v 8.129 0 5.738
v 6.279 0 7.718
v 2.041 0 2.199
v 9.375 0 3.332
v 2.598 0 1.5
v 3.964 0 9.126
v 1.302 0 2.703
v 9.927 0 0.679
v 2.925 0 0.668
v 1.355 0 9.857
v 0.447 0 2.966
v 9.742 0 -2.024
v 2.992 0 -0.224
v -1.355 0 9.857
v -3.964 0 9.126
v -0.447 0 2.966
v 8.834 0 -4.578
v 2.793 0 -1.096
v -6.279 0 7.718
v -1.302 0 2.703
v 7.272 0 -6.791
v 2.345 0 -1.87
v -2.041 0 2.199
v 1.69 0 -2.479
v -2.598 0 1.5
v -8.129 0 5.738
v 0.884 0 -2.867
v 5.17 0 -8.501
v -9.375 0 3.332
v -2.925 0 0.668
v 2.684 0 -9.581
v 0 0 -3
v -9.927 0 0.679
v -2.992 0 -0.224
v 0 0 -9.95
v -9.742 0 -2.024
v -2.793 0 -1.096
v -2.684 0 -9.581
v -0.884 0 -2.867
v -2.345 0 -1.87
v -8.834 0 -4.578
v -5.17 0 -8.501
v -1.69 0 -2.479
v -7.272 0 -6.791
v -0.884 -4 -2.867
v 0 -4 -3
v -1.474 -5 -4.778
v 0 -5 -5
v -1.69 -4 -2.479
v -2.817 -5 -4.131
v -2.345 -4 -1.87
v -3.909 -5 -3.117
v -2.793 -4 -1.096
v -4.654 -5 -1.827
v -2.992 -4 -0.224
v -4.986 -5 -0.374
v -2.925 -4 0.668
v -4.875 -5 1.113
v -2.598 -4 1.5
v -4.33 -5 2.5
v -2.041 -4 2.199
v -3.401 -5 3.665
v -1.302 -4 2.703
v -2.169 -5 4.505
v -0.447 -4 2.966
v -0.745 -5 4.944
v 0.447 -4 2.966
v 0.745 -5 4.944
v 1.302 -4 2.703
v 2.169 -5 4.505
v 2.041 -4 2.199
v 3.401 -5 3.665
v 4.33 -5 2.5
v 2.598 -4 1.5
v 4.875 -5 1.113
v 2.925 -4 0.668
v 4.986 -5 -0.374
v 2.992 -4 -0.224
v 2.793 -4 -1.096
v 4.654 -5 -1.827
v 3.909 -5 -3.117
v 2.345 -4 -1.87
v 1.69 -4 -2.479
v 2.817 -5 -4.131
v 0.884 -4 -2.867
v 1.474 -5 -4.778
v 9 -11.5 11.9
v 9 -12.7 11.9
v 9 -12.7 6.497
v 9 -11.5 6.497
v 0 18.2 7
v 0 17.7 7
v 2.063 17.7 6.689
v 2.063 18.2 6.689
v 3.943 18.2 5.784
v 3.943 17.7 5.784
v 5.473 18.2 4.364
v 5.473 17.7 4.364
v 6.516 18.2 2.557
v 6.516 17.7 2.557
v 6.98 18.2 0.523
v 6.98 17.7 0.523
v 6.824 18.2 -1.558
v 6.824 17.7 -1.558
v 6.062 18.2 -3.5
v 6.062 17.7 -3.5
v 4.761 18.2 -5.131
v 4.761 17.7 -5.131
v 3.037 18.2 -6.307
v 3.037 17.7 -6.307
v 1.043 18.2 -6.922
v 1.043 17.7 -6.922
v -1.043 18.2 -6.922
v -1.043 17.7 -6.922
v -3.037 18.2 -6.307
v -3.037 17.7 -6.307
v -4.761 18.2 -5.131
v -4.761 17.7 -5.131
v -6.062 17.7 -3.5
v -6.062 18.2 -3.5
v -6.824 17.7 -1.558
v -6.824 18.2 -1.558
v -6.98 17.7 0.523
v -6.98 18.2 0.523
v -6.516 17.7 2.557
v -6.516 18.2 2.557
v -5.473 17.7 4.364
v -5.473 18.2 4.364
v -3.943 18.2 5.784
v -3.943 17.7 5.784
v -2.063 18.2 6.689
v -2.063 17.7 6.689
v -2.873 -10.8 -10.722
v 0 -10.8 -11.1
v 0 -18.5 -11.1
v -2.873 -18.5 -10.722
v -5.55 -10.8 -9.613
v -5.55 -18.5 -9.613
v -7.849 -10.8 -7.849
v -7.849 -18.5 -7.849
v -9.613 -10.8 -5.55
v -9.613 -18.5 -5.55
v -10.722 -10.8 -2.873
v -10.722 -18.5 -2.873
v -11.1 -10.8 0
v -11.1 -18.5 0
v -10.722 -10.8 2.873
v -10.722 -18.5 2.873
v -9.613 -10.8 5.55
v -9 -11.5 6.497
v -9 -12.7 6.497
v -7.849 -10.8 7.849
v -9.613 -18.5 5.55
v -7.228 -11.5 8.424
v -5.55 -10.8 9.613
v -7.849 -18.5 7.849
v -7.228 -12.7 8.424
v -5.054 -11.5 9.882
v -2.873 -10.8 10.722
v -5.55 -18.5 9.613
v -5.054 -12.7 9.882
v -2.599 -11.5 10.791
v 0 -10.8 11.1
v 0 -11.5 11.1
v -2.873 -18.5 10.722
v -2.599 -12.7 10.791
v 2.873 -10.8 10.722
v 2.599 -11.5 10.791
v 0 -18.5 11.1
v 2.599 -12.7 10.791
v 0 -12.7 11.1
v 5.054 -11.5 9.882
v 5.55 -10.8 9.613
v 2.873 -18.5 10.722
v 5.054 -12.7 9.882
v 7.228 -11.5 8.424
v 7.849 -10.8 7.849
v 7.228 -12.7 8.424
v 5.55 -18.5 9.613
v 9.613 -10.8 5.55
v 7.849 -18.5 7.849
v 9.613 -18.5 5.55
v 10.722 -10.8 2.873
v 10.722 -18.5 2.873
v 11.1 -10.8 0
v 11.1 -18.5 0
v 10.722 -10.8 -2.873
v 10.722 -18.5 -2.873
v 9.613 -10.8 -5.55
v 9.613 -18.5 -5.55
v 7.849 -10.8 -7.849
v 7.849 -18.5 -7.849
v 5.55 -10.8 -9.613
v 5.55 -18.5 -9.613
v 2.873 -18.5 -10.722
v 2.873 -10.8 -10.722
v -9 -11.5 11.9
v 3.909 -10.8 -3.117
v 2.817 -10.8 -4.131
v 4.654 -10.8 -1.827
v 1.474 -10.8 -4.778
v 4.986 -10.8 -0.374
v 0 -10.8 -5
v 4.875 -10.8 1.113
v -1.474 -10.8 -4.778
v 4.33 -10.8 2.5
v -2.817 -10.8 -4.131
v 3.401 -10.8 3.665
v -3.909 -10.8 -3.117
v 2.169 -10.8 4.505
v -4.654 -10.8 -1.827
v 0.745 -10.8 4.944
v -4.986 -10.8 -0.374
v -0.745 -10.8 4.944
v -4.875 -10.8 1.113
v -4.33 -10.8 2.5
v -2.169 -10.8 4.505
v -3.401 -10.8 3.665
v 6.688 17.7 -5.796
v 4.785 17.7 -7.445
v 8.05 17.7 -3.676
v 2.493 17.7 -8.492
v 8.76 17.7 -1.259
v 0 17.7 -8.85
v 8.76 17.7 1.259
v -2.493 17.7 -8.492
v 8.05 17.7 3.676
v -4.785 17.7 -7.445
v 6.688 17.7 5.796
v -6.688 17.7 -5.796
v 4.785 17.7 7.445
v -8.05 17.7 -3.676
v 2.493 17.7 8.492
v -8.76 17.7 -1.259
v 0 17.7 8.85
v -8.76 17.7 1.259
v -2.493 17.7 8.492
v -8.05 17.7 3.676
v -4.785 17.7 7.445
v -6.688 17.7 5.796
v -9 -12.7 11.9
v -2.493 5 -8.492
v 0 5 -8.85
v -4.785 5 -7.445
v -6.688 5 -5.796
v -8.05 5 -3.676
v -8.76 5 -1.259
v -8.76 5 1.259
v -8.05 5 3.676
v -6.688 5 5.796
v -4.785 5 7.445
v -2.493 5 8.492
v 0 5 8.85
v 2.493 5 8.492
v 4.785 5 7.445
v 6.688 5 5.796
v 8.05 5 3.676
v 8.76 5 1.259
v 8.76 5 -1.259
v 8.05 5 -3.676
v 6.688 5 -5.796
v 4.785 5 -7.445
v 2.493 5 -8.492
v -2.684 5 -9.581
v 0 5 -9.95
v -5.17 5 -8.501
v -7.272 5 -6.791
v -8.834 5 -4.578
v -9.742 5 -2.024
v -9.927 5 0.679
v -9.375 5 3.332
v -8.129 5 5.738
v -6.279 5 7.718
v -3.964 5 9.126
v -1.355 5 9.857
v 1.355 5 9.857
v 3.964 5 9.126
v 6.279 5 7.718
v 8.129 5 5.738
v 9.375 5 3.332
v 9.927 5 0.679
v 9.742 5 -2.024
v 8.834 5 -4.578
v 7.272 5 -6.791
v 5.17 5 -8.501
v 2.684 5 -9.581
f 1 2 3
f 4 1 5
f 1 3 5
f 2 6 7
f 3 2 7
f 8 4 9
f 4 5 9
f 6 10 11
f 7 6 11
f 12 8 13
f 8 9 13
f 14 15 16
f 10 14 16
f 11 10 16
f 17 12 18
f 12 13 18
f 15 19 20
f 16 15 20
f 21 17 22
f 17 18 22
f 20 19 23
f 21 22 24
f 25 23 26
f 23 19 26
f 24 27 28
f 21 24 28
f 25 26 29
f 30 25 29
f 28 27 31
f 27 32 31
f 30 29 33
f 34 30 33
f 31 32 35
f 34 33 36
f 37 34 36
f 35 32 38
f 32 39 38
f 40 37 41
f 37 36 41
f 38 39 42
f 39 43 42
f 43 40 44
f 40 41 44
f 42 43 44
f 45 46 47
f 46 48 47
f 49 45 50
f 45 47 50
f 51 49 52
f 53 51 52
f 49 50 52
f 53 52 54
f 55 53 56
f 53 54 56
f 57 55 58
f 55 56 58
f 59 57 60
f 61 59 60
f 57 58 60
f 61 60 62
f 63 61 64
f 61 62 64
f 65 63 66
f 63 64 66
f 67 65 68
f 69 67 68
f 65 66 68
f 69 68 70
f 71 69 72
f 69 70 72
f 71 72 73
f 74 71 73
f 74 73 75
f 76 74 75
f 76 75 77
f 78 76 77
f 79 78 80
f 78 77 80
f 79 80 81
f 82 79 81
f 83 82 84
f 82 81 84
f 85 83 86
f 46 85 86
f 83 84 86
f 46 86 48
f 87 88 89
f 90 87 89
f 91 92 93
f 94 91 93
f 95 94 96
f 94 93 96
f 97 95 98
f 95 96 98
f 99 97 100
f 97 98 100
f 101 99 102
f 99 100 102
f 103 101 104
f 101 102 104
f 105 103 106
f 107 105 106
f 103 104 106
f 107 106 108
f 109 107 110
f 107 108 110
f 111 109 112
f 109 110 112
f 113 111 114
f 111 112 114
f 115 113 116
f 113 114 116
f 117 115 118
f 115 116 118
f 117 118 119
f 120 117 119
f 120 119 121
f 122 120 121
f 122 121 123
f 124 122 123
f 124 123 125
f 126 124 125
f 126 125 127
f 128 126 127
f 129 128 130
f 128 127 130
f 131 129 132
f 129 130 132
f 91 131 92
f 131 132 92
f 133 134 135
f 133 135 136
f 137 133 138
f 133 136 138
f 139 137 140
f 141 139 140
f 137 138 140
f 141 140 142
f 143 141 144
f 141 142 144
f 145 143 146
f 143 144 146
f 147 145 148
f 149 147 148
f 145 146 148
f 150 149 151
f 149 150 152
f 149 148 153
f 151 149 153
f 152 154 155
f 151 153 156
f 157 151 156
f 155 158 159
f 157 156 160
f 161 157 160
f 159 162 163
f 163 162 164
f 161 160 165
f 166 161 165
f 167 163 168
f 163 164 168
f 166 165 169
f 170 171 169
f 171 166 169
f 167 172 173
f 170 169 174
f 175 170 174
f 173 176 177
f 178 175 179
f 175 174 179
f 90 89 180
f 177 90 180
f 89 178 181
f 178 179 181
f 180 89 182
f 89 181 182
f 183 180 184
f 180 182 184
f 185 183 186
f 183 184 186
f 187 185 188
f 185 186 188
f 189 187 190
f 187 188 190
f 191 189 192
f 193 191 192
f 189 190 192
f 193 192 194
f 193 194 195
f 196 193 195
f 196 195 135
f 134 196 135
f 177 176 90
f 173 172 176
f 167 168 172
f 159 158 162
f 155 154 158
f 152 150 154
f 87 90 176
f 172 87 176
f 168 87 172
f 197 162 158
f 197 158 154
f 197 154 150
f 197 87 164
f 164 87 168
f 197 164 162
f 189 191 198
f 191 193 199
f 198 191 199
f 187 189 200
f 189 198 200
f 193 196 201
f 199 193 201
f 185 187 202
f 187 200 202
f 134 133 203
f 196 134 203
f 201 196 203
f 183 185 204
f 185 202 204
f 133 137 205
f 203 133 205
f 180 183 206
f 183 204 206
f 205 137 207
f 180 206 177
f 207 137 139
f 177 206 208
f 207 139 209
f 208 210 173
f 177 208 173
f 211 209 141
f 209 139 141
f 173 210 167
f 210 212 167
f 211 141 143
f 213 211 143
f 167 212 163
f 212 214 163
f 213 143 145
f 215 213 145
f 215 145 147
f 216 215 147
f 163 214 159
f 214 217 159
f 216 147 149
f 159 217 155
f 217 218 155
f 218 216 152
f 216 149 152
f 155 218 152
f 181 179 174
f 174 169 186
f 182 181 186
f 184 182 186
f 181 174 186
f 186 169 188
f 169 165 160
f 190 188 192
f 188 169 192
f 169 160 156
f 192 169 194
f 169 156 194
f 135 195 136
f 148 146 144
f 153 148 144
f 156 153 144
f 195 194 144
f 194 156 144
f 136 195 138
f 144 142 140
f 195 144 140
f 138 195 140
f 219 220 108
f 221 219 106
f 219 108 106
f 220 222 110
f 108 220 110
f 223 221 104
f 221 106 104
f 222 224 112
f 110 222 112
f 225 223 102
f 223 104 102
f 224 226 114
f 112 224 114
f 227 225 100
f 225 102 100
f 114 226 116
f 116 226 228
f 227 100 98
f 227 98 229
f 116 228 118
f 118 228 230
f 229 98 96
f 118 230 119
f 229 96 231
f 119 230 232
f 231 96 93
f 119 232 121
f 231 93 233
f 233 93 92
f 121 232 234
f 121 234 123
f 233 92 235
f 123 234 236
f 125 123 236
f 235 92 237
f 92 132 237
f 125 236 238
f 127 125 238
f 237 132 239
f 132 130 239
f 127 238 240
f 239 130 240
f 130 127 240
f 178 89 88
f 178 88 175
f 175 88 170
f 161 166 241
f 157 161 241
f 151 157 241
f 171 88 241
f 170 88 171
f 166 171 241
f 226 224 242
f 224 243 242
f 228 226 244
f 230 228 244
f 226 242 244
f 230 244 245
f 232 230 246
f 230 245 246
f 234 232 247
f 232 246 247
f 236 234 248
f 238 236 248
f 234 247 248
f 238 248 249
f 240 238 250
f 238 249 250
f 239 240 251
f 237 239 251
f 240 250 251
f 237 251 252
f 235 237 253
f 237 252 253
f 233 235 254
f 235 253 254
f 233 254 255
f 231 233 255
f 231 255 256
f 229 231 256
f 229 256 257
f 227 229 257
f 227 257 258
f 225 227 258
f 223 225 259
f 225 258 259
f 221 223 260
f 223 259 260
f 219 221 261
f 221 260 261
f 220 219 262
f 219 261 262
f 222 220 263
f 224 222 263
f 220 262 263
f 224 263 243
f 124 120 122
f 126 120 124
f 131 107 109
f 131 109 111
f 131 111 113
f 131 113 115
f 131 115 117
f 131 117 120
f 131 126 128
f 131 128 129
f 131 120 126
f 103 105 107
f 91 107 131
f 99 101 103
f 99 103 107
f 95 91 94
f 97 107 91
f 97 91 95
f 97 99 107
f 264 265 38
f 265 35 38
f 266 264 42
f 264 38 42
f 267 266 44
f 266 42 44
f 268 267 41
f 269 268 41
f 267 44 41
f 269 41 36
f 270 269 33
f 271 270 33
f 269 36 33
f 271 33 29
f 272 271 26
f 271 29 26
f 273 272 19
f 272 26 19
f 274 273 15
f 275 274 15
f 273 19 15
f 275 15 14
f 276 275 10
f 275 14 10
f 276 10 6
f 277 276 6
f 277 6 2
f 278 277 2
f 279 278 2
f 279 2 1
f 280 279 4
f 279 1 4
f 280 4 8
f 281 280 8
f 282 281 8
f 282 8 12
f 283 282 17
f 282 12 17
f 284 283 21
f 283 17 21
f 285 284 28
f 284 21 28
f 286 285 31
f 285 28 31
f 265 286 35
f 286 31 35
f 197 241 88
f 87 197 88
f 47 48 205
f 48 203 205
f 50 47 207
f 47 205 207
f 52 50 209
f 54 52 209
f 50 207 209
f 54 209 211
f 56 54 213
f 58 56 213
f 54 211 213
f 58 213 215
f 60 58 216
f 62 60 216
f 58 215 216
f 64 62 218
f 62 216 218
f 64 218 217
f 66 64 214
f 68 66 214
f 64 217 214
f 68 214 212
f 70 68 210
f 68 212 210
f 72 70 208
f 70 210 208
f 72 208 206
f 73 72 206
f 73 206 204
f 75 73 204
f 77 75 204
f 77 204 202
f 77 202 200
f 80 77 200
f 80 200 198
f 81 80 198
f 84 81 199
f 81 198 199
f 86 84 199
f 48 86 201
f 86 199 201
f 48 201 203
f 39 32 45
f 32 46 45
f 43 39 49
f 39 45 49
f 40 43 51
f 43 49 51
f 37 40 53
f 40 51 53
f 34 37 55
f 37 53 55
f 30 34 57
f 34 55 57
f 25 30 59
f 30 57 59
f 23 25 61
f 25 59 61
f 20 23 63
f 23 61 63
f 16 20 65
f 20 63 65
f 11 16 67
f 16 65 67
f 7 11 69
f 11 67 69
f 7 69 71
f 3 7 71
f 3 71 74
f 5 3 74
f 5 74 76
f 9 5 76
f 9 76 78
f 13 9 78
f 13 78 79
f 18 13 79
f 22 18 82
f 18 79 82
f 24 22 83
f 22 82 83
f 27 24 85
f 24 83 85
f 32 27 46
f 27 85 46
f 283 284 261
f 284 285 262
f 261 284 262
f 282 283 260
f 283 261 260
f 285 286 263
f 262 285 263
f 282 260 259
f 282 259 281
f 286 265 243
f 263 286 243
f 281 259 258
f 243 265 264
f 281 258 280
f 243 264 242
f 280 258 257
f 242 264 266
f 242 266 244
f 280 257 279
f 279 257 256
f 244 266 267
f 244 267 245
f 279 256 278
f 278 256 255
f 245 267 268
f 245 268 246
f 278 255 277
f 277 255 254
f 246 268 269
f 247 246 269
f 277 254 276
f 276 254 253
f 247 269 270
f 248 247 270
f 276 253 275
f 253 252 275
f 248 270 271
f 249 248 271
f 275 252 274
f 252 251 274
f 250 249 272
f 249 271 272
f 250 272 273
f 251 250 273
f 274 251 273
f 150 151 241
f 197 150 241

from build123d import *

# Parameters (mm, degrees)
BOSS_EXTRU_1_START = -5.8
BOSS_EXTRU_1_DEPTH = 1.2
ESQUISSE4_R        = 7
BOSS_EXTRU_2_DEPTH = 0.5


with BuildPart() as part:
    # Esquisse2 → Révolution1 (revolve)
    with BuildSketch(Plane.XY, mode=Mode.PRIVATE) as r_volution1_sk:
        Polygon((0, 17.7), (-8.85, 17.7), (-8.85, 5), (-9.95, 5), (-9.95, 0), (-3, 0), (-3, -4), (-5, -5), (-5, -10.8), (-11.1, -10.8), (-11.1, -18.5), (0, -18.5), align=None)
    revolve(r_volution1_sk.sketch.rotate(Axis((0, -55, 0), (0, 1, 0)), 270), axis=Axis((0, -55, 0), (0, 1, 0)))

    # Esquisse3 → Boss.-Extru.1 (add)
    with BuildSketch(Plane.XZ.offset(18.5).offset(BOSS_EXTRU_1_START)):
        with BuildLine():
            Line((-9, 6.496922348), (-9, 11.9))
            Line((-9, 11.9), (9, 11.9))
            Line((9, 11.9), (9, 6.496922348))
            ThreePointArc((9, 6.496922348), (0, 11.1), (-9, 6.496922348))
        make_face()
    extrude(amount=-BOSS_EXTRU_1_DEPTH)

    # Esquisse4 → Boss.-Extru.2 (add)
    with BuildSketch(Plane(origin=(0, 17.7, 0), x_dir=(1, 0, 0), z_dir=(0, 1, 0))):
        with Locations(Location((0, 0, 0), (0, 0, 270))):
            Circle(ESQUISSE4_R)
    extrude(amount=BOSS_EXTRU_2_DEPTH)


solid = part.part
